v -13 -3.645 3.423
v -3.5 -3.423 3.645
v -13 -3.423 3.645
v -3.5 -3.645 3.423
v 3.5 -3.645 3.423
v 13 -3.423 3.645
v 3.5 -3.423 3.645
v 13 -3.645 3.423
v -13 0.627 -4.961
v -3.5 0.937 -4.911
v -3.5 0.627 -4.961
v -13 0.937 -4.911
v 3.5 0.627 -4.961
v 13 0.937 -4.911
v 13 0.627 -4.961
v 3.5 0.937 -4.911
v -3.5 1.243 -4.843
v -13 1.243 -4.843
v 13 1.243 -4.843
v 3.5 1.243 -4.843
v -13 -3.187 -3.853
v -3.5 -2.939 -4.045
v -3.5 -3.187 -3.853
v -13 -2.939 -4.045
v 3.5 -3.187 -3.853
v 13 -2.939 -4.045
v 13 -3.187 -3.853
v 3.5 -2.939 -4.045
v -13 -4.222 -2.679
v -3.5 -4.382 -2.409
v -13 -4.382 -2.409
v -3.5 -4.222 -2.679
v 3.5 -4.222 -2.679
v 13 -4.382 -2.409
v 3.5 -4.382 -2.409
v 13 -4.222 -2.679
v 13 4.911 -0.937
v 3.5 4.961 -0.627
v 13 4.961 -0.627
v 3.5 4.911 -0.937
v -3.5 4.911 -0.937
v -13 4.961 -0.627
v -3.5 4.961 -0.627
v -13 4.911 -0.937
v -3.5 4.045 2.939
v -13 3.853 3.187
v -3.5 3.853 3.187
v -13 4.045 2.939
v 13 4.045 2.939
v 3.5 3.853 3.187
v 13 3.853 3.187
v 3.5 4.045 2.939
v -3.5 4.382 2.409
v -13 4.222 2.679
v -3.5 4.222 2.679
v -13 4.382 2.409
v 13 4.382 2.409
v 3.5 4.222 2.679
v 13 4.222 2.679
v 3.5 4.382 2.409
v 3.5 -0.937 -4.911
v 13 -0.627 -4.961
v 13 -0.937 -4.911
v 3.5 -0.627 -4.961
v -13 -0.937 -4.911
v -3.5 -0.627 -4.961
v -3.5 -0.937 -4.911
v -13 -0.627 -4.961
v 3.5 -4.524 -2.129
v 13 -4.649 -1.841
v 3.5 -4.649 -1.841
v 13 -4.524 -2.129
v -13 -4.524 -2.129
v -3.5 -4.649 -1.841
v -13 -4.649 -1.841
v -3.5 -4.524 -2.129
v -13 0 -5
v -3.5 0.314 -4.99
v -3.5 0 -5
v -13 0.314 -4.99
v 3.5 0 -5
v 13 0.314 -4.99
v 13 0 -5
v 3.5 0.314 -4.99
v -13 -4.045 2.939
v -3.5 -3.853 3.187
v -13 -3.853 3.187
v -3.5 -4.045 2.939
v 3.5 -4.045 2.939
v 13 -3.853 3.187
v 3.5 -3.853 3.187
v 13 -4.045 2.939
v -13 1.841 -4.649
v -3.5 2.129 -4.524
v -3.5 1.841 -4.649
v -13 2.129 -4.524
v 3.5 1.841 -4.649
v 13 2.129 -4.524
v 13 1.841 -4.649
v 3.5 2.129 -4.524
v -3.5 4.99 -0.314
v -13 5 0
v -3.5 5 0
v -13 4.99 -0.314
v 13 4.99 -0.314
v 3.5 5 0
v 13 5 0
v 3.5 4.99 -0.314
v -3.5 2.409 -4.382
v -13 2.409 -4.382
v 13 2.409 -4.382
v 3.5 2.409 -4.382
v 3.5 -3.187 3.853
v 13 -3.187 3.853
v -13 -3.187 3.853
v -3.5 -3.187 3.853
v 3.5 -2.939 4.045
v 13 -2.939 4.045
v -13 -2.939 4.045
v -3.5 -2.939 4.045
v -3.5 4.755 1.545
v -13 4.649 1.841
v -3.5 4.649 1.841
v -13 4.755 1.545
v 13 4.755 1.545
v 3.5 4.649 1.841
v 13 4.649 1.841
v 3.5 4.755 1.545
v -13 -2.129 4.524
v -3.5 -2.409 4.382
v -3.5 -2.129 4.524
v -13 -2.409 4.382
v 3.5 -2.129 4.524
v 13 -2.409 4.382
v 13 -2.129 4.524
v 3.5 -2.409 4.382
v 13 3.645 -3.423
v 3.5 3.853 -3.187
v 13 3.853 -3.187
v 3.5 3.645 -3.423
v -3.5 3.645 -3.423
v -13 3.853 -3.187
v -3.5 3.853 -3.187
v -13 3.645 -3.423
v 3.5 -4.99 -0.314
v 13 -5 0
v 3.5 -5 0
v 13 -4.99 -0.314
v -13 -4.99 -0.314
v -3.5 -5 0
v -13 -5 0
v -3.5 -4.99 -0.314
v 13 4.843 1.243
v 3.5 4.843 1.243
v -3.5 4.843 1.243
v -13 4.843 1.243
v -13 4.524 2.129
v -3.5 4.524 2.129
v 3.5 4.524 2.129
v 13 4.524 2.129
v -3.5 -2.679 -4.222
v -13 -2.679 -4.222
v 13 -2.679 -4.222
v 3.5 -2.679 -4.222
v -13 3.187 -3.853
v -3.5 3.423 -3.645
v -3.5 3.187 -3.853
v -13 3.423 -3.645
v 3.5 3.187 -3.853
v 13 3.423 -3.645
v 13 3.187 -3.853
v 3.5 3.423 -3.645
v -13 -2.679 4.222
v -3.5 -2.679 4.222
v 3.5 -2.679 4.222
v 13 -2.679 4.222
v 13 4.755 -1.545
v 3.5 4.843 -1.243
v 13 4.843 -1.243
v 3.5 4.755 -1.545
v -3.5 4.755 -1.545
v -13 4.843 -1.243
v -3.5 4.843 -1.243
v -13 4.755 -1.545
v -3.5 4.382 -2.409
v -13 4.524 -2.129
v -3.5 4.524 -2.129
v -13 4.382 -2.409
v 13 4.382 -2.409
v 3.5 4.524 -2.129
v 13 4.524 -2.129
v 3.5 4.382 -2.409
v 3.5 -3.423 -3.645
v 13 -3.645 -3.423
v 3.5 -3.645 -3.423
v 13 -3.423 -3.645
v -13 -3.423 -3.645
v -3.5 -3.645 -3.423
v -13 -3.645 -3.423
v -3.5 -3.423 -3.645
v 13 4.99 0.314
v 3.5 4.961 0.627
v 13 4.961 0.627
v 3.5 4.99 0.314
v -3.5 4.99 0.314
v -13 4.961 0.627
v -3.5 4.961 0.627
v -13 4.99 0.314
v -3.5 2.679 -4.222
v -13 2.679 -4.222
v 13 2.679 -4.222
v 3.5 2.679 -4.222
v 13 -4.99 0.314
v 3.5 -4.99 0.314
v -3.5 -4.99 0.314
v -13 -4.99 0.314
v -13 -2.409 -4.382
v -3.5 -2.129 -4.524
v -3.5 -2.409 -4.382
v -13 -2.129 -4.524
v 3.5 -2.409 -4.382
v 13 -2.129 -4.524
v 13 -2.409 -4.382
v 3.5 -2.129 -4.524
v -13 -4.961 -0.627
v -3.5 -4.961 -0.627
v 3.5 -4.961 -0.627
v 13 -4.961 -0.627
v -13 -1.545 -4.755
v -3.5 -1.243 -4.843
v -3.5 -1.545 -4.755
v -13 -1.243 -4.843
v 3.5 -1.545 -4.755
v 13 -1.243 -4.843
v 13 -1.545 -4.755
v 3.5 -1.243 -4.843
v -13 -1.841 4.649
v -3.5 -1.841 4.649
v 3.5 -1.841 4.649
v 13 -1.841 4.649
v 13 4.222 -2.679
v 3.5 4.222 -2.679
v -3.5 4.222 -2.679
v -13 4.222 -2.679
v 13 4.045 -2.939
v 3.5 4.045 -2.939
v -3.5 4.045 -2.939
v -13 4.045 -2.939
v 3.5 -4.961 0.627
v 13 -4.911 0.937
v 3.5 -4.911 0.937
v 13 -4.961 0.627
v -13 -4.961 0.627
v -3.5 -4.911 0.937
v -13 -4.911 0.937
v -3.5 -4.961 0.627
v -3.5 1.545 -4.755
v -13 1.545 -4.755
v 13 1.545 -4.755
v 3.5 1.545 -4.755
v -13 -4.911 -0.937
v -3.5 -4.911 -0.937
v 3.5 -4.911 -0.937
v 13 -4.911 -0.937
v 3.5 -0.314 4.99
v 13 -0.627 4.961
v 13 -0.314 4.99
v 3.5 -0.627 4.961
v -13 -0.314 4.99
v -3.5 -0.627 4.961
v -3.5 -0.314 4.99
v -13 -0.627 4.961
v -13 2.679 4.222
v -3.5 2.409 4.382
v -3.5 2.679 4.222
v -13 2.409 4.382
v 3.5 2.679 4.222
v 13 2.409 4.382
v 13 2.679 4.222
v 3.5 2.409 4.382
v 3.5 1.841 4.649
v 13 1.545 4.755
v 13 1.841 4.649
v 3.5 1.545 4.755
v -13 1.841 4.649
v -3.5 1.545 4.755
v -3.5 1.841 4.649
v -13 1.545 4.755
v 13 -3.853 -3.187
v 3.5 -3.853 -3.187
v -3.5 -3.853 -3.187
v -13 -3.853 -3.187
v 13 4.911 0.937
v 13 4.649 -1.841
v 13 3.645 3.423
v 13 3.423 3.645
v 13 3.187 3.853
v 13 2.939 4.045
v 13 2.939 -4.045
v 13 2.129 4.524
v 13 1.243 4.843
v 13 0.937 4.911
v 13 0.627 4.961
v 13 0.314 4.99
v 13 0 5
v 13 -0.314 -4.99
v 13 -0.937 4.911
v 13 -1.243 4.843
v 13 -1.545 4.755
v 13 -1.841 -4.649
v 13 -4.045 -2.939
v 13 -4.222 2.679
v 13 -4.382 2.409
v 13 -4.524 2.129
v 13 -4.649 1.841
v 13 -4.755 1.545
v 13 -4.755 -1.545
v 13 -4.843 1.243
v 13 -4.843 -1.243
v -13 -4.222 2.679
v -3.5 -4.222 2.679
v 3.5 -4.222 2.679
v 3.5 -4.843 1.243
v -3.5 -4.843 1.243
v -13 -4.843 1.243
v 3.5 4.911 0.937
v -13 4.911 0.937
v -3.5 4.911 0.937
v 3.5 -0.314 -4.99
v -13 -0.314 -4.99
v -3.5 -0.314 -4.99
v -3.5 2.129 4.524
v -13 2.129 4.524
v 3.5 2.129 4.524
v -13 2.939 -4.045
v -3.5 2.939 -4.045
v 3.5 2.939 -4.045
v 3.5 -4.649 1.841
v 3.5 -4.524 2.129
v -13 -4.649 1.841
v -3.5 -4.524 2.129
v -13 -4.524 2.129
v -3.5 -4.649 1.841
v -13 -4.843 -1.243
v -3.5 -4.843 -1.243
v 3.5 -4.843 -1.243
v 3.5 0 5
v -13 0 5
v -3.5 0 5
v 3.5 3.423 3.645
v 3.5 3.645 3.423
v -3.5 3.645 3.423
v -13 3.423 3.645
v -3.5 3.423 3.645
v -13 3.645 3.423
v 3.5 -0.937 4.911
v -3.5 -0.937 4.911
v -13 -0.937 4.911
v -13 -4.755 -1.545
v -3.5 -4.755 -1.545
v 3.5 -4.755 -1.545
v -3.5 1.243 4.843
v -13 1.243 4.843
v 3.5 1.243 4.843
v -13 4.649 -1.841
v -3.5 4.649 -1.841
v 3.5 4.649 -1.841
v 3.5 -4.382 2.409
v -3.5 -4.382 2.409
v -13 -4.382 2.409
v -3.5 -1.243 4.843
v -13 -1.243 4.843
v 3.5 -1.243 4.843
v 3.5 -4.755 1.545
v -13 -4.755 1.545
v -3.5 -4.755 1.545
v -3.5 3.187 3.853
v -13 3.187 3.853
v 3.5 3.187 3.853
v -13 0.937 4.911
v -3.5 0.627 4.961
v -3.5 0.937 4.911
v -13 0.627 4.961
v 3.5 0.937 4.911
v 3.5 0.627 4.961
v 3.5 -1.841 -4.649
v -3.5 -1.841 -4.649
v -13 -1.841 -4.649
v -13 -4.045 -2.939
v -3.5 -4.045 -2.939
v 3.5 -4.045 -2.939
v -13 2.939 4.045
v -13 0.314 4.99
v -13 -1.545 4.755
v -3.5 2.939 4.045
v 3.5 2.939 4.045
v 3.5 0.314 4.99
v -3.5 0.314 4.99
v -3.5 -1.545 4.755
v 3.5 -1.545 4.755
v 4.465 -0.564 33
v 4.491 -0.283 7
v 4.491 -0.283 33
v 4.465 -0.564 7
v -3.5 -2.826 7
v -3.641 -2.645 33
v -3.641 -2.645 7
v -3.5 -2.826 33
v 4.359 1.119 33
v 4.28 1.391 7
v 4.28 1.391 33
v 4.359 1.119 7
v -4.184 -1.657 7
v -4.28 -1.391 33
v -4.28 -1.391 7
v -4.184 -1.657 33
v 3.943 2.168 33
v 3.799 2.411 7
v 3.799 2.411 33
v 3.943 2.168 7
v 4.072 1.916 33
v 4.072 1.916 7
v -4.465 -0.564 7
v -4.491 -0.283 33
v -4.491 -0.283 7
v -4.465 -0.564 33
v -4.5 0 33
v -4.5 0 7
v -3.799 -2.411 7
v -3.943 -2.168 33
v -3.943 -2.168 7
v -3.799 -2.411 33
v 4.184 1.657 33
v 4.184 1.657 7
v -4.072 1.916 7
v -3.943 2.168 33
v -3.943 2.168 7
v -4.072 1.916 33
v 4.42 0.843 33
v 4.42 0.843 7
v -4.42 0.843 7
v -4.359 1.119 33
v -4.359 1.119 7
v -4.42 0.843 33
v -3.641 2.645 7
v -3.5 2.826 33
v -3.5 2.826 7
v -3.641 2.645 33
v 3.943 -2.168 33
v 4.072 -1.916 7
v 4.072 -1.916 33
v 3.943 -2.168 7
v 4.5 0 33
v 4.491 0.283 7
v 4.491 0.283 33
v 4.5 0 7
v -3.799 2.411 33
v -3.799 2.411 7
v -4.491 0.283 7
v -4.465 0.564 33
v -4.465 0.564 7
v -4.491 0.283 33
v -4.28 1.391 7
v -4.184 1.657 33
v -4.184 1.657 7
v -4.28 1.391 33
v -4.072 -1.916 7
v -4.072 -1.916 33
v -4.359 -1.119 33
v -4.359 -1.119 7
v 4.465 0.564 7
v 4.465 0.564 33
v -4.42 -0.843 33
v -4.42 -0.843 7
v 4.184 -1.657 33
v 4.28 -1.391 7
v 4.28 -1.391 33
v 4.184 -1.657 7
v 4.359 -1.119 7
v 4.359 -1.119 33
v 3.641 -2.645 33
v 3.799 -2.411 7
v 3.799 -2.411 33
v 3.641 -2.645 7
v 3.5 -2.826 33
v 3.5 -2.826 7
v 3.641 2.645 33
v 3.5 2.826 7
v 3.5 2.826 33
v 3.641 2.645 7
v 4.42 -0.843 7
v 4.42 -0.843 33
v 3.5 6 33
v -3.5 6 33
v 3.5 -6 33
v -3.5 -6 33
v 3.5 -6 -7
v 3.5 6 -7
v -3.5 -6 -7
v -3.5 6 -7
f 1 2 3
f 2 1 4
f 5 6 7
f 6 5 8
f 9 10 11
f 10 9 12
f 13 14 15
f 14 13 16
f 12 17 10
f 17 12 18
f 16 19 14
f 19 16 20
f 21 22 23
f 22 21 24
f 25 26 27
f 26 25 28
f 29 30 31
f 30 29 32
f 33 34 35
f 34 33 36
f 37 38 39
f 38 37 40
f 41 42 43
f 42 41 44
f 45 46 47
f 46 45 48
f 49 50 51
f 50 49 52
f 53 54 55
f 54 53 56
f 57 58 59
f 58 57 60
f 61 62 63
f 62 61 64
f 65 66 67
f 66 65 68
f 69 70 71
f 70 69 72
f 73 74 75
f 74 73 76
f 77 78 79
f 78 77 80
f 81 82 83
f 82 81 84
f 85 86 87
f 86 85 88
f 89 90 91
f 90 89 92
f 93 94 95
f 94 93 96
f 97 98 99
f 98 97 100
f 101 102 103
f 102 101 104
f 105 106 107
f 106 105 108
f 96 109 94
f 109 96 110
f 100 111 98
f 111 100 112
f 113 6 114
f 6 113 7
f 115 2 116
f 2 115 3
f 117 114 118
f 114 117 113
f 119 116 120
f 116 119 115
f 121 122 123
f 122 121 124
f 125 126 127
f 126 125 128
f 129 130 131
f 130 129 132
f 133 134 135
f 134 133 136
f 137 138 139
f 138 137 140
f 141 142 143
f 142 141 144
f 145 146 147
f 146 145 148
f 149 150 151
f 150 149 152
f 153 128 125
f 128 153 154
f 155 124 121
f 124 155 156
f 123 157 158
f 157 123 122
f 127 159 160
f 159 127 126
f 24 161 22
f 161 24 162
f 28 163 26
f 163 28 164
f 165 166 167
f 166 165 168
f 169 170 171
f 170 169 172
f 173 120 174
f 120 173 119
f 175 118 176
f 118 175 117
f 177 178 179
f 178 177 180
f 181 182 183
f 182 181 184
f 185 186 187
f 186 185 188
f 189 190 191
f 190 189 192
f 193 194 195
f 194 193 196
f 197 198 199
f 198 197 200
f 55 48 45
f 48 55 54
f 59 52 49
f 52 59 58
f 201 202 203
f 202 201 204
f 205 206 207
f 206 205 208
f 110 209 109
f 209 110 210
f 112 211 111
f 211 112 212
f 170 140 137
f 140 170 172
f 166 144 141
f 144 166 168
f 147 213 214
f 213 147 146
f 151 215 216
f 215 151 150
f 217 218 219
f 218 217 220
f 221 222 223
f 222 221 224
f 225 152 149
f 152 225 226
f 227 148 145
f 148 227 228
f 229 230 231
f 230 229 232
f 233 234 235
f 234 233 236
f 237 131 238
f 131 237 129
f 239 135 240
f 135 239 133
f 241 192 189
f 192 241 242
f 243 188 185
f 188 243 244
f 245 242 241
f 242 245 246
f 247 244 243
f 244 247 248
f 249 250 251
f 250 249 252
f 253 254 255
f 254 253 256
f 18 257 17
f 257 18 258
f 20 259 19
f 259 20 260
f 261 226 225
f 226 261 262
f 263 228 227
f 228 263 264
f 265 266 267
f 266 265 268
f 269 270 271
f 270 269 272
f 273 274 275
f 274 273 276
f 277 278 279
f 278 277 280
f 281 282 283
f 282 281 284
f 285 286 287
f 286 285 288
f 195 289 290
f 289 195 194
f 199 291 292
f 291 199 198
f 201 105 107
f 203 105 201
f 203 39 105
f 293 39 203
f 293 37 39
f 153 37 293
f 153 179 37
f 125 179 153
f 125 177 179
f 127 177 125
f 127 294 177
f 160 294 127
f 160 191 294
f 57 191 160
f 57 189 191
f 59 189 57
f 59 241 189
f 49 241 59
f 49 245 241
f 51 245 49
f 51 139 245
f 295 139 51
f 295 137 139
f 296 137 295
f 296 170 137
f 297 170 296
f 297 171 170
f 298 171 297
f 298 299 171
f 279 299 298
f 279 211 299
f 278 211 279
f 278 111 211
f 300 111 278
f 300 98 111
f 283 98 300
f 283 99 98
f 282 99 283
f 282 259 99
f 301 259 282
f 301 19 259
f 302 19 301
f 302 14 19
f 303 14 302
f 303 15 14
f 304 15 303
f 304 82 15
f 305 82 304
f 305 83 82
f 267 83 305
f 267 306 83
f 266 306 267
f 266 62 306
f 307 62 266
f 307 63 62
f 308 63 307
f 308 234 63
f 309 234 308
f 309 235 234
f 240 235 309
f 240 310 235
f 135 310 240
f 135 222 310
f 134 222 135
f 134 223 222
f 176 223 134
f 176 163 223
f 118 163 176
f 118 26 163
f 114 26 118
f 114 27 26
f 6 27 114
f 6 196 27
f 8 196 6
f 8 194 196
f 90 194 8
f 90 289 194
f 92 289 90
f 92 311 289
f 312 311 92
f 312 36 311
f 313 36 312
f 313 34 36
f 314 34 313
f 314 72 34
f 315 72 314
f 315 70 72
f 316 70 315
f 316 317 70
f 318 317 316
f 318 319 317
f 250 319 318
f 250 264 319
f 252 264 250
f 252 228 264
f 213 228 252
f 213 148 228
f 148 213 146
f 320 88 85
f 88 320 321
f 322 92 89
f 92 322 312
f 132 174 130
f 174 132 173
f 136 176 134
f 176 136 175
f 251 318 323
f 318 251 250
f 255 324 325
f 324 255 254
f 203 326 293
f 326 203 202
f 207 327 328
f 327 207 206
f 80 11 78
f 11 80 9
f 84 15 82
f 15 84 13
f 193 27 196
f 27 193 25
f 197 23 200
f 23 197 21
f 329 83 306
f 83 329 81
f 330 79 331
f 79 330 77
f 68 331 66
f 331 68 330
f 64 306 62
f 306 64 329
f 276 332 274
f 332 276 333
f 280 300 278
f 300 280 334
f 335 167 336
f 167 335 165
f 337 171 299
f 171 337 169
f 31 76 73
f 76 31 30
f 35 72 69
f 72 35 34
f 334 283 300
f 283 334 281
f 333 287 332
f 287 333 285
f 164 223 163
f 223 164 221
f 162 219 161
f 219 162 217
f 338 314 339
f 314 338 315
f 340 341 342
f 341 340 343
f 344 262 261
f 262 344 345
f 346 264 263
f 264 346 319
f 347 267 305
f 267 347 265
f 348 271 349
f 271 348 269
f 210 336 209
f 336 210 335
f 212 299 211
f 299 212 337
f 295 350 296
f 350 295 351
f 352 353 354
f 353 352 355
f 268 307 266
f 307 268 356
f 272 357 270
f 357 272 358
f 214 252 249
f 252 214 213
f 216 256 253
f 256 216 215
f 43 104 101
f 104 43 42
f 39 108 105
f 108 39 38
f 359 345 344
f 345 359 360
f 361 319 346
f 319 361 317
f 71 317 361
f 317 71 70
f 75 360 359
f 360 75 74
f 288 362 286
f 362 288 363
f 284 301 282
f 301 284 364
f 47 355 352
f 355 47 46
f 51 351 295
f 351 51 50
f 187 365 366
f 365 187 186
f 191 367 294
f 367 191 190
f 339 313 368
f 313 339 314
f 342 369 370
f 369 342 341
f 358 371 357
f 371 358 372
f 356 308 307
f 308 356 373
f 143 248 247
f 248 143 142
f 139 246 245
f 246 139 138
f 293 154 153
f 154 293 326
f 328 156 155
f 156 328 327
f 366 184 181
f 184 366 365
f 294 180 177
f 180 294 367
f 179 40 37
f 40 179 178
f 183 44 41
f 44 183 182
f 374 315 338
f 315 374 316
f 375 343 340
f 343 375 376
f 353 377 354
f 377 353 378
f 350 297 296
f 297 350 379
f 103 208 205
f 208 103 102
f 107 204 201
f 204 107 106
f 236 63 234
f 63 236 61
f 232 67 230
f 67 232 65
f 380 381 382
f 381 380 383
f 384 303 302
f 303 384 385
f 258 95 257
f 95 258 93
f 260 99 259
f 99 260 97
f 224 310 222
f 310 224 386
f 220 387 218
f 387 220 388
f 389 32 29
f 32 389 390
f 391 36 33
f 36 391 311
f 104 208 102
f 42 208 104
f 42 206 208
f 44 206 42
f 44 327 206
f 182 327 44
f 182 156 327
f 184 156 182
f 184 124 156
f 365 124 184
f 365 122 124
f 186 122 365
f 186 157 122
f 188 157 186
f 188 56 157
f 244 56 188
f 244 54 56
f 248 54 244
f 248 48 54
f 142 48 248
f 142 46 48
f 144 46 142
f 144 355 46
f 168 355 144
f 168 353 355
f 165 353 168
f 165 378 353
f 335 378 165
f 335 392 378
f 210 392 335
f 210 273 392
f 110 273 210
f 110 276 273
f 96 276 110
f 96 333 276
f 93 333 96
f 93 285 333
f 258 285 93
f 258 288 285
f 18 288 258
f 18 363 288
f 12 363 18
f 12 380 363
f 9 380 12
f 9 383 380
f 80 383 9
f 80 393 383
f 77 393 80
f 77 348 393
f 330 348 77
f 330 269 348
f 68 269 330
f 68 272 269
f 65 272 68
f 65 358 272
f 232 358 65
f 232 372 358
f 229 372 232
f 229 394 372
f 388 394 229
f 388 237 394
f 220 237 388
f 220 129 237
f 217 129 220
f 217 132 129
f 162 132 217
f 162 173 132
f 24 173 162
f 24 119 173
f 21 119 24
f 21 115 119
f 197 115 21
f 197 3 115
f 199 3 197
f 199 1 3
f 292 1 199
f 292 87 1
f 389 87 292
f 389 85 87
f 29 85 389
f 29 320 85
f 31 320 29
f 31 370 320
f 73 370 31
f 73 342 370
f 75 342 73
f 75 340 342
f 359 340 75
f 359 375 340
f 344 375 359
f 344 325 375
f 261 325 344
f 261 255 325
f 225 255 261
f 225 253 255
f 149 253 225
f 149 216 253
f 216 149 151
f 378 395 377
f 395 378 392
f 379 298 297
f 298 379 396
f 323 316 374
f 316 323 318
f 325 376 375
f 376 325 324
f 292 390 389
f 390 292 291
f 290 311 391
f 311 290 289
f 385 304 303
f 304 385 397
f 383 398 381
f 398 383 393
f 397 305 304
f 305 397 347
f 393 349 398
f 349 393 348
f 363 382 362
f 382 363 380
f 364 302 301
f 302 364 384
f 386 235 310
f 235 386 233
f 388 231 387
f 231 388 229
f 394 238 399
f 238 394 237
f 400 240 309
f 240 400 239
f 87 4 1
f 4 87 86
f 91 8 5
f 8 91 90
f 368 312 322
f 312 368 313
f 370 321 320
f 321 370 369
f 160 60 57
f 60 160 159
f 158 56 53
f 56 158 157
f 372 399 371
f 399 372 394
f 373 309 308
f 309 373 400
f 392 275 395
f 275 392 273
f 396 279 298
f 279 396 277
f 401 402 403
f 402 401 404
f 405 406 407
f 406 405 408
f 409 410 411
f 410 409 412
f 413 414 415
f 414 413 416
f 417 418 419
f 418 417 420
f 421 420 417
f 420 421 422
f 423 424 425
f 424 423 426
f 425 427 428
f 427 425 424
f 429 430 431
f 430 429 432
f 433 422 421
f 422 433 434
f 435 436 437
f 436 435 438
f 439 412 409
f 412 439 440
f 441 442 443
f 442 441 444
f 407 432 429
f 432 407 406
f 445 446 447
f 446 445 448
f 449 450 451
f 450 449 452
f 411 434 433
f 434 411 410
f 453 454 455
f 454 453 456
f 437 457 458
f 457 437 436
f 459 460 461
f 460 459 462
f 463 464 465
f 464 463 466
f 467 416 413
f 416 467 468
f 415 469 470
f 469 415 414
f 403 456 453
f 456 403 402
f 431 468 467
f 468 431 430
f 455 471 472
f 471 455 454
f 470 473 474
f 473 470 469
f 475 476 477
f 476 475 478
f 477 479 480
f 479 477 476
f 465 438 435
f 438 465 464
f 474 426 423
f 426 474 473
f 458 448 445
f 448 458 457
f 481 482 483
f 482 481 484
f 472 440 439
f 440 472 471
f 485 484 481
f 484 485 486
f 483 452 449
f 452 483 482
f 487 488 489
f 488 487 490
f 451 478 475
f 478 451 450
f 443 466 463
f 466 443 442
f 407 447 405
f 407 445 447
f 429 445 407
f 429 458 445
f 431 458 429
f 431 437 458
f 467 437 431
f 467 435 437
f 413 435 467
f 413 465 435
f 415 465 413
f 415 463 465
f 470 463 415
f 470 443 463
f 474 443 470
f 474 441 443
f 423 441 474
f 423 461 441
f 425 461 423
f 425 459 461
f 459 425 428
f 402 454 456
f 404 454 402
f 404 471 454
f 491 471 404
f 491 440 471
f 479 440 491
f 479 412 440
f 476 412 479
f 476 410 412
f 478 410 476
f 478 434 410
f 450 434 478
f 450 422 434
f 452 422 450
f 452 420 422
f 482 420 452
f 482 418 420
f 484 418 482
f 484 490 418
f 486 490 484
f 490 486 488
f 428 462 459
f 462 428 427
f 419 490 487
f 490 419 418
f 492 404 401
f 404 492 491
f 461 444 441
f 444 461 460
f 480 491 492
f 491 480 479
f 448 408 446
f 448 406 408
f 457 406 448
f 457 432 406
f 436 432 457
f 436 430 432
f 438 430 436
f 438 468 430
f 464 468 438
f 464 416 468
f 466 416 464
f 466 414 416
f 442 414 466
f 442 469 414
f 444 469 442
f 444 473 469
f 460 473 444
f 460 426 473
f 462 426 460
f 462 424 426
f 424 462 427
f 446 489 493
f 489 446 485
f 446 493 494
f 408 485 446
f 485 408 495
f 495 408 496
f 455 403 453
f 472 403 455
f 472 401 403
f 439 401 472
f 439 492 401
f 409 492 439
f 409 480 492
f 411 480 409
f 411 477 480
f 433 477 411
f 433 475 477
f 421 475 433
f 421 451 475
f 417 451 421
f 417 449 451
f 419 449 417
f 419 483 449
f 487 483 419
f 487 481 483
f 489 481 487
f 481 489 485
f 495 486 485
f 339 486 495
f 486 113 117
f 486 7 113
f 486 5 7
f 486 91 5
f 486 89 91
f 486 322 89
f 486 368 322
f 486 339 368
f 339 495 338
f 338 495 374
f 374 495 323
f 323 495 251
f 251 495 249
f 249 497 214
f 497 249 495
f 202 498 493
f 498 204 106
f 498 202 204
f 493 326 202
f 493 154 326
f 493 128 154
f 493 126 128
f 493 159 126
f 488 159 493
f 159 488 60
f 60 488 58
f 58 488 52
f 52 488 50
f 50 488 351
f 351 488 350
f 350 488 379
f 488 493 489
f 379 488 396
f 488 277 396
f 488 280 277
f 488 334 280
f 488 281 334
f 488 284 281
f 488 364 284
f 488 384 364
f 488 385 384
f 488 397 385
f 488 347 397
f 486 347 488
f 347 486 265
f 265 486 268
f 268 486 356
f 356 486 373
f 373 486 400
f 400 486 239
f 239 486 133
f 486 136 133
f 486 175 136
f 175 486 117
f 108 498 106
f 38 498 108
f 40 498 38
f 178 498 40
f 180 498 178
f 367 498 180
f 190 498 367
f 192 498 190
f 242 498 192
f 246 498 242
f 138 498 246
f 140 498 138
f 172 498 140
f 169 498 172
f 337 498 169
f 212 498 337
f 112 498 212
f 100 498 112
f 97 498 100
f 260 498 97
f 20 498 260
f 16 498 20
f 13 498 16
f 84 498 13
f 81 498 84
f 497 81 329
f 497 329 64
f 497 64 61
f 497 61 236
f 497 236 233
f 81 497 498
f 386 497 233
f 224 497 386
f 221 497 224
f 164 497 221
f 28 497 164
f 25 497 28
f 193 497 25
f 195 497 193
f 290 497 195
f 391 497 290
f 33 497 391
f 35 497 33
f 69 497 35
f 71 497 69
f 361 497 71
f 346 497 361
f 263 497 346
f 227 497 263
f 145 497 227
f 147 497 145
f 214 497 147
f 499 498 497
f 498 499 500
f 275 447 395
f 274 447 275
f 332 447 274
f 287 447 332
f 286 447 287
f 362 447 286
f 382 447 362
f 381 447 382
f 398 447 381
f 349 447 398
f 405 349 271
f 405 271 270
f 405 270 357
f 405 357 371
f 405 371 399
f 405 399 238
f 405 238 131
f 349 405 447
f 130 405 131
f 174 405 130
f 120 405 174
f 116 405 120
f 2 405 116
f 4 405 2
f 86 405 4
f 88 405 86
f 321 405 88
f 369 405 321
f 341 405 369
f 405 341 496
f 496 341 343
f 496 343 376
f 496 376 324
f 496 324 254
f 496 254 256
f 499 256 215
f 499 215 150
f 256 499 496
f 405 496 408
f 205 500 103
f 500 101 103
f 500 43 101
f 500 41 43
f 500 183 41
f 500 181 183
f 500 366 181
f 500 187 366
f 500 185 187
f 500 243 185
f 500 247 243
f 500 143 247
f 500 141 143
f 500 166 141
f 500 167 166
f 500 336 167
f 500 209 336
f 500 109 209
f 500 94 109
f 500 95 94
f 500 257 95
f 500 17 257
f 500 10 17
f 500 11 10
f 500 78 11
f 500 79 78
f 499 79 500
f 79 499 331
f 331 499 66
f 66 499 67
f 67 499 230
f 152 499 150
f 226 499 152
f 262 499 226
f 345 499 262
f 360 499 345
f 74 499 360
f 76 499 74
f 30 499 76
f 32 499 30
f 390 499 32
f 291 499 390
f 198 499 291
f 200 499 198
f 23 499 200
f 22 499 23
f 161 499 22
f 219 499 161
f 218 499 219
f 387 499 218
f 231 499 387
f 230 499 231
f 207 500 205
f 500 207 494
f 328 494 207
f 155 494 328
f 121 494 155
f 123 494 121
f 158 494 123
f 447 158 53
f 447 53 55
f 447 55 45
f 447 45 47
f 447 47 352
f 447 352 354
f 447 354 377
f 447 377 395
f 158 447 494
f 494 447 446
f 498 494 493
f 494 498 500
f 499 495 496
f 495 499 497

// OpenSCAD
translate([0,-7,-7]){


        difference(){
            union(){

                translate([-13,7,7]){
                    rotate([0,90,0]){
                        cylinder(h=26, r=5, $fn=100, center=false);
                    }
                }  


                translate([0,7,14]){
                    rotate([0,0,90]){
                        cylinder(h=40-14, r=4.5, $fn=100, center=false);
                    }
                }  

                translate([10,7,7]){
                    rotate([0,0,90]){
//                        cylinder(h=40-7, r=1.2, $fn=100, center=false);
                    }
                }  
                translate([-10,7,7]){
                    rotate([0,0,90]){
//                        cylinder(h=40-7, r=1.2, $fn=100, center=false);
                    }
                }  


                translate([-3.5,1,0]){
                    cube([7,12,40], center=false);
                }

            }
            union() {



            }
        }
}
